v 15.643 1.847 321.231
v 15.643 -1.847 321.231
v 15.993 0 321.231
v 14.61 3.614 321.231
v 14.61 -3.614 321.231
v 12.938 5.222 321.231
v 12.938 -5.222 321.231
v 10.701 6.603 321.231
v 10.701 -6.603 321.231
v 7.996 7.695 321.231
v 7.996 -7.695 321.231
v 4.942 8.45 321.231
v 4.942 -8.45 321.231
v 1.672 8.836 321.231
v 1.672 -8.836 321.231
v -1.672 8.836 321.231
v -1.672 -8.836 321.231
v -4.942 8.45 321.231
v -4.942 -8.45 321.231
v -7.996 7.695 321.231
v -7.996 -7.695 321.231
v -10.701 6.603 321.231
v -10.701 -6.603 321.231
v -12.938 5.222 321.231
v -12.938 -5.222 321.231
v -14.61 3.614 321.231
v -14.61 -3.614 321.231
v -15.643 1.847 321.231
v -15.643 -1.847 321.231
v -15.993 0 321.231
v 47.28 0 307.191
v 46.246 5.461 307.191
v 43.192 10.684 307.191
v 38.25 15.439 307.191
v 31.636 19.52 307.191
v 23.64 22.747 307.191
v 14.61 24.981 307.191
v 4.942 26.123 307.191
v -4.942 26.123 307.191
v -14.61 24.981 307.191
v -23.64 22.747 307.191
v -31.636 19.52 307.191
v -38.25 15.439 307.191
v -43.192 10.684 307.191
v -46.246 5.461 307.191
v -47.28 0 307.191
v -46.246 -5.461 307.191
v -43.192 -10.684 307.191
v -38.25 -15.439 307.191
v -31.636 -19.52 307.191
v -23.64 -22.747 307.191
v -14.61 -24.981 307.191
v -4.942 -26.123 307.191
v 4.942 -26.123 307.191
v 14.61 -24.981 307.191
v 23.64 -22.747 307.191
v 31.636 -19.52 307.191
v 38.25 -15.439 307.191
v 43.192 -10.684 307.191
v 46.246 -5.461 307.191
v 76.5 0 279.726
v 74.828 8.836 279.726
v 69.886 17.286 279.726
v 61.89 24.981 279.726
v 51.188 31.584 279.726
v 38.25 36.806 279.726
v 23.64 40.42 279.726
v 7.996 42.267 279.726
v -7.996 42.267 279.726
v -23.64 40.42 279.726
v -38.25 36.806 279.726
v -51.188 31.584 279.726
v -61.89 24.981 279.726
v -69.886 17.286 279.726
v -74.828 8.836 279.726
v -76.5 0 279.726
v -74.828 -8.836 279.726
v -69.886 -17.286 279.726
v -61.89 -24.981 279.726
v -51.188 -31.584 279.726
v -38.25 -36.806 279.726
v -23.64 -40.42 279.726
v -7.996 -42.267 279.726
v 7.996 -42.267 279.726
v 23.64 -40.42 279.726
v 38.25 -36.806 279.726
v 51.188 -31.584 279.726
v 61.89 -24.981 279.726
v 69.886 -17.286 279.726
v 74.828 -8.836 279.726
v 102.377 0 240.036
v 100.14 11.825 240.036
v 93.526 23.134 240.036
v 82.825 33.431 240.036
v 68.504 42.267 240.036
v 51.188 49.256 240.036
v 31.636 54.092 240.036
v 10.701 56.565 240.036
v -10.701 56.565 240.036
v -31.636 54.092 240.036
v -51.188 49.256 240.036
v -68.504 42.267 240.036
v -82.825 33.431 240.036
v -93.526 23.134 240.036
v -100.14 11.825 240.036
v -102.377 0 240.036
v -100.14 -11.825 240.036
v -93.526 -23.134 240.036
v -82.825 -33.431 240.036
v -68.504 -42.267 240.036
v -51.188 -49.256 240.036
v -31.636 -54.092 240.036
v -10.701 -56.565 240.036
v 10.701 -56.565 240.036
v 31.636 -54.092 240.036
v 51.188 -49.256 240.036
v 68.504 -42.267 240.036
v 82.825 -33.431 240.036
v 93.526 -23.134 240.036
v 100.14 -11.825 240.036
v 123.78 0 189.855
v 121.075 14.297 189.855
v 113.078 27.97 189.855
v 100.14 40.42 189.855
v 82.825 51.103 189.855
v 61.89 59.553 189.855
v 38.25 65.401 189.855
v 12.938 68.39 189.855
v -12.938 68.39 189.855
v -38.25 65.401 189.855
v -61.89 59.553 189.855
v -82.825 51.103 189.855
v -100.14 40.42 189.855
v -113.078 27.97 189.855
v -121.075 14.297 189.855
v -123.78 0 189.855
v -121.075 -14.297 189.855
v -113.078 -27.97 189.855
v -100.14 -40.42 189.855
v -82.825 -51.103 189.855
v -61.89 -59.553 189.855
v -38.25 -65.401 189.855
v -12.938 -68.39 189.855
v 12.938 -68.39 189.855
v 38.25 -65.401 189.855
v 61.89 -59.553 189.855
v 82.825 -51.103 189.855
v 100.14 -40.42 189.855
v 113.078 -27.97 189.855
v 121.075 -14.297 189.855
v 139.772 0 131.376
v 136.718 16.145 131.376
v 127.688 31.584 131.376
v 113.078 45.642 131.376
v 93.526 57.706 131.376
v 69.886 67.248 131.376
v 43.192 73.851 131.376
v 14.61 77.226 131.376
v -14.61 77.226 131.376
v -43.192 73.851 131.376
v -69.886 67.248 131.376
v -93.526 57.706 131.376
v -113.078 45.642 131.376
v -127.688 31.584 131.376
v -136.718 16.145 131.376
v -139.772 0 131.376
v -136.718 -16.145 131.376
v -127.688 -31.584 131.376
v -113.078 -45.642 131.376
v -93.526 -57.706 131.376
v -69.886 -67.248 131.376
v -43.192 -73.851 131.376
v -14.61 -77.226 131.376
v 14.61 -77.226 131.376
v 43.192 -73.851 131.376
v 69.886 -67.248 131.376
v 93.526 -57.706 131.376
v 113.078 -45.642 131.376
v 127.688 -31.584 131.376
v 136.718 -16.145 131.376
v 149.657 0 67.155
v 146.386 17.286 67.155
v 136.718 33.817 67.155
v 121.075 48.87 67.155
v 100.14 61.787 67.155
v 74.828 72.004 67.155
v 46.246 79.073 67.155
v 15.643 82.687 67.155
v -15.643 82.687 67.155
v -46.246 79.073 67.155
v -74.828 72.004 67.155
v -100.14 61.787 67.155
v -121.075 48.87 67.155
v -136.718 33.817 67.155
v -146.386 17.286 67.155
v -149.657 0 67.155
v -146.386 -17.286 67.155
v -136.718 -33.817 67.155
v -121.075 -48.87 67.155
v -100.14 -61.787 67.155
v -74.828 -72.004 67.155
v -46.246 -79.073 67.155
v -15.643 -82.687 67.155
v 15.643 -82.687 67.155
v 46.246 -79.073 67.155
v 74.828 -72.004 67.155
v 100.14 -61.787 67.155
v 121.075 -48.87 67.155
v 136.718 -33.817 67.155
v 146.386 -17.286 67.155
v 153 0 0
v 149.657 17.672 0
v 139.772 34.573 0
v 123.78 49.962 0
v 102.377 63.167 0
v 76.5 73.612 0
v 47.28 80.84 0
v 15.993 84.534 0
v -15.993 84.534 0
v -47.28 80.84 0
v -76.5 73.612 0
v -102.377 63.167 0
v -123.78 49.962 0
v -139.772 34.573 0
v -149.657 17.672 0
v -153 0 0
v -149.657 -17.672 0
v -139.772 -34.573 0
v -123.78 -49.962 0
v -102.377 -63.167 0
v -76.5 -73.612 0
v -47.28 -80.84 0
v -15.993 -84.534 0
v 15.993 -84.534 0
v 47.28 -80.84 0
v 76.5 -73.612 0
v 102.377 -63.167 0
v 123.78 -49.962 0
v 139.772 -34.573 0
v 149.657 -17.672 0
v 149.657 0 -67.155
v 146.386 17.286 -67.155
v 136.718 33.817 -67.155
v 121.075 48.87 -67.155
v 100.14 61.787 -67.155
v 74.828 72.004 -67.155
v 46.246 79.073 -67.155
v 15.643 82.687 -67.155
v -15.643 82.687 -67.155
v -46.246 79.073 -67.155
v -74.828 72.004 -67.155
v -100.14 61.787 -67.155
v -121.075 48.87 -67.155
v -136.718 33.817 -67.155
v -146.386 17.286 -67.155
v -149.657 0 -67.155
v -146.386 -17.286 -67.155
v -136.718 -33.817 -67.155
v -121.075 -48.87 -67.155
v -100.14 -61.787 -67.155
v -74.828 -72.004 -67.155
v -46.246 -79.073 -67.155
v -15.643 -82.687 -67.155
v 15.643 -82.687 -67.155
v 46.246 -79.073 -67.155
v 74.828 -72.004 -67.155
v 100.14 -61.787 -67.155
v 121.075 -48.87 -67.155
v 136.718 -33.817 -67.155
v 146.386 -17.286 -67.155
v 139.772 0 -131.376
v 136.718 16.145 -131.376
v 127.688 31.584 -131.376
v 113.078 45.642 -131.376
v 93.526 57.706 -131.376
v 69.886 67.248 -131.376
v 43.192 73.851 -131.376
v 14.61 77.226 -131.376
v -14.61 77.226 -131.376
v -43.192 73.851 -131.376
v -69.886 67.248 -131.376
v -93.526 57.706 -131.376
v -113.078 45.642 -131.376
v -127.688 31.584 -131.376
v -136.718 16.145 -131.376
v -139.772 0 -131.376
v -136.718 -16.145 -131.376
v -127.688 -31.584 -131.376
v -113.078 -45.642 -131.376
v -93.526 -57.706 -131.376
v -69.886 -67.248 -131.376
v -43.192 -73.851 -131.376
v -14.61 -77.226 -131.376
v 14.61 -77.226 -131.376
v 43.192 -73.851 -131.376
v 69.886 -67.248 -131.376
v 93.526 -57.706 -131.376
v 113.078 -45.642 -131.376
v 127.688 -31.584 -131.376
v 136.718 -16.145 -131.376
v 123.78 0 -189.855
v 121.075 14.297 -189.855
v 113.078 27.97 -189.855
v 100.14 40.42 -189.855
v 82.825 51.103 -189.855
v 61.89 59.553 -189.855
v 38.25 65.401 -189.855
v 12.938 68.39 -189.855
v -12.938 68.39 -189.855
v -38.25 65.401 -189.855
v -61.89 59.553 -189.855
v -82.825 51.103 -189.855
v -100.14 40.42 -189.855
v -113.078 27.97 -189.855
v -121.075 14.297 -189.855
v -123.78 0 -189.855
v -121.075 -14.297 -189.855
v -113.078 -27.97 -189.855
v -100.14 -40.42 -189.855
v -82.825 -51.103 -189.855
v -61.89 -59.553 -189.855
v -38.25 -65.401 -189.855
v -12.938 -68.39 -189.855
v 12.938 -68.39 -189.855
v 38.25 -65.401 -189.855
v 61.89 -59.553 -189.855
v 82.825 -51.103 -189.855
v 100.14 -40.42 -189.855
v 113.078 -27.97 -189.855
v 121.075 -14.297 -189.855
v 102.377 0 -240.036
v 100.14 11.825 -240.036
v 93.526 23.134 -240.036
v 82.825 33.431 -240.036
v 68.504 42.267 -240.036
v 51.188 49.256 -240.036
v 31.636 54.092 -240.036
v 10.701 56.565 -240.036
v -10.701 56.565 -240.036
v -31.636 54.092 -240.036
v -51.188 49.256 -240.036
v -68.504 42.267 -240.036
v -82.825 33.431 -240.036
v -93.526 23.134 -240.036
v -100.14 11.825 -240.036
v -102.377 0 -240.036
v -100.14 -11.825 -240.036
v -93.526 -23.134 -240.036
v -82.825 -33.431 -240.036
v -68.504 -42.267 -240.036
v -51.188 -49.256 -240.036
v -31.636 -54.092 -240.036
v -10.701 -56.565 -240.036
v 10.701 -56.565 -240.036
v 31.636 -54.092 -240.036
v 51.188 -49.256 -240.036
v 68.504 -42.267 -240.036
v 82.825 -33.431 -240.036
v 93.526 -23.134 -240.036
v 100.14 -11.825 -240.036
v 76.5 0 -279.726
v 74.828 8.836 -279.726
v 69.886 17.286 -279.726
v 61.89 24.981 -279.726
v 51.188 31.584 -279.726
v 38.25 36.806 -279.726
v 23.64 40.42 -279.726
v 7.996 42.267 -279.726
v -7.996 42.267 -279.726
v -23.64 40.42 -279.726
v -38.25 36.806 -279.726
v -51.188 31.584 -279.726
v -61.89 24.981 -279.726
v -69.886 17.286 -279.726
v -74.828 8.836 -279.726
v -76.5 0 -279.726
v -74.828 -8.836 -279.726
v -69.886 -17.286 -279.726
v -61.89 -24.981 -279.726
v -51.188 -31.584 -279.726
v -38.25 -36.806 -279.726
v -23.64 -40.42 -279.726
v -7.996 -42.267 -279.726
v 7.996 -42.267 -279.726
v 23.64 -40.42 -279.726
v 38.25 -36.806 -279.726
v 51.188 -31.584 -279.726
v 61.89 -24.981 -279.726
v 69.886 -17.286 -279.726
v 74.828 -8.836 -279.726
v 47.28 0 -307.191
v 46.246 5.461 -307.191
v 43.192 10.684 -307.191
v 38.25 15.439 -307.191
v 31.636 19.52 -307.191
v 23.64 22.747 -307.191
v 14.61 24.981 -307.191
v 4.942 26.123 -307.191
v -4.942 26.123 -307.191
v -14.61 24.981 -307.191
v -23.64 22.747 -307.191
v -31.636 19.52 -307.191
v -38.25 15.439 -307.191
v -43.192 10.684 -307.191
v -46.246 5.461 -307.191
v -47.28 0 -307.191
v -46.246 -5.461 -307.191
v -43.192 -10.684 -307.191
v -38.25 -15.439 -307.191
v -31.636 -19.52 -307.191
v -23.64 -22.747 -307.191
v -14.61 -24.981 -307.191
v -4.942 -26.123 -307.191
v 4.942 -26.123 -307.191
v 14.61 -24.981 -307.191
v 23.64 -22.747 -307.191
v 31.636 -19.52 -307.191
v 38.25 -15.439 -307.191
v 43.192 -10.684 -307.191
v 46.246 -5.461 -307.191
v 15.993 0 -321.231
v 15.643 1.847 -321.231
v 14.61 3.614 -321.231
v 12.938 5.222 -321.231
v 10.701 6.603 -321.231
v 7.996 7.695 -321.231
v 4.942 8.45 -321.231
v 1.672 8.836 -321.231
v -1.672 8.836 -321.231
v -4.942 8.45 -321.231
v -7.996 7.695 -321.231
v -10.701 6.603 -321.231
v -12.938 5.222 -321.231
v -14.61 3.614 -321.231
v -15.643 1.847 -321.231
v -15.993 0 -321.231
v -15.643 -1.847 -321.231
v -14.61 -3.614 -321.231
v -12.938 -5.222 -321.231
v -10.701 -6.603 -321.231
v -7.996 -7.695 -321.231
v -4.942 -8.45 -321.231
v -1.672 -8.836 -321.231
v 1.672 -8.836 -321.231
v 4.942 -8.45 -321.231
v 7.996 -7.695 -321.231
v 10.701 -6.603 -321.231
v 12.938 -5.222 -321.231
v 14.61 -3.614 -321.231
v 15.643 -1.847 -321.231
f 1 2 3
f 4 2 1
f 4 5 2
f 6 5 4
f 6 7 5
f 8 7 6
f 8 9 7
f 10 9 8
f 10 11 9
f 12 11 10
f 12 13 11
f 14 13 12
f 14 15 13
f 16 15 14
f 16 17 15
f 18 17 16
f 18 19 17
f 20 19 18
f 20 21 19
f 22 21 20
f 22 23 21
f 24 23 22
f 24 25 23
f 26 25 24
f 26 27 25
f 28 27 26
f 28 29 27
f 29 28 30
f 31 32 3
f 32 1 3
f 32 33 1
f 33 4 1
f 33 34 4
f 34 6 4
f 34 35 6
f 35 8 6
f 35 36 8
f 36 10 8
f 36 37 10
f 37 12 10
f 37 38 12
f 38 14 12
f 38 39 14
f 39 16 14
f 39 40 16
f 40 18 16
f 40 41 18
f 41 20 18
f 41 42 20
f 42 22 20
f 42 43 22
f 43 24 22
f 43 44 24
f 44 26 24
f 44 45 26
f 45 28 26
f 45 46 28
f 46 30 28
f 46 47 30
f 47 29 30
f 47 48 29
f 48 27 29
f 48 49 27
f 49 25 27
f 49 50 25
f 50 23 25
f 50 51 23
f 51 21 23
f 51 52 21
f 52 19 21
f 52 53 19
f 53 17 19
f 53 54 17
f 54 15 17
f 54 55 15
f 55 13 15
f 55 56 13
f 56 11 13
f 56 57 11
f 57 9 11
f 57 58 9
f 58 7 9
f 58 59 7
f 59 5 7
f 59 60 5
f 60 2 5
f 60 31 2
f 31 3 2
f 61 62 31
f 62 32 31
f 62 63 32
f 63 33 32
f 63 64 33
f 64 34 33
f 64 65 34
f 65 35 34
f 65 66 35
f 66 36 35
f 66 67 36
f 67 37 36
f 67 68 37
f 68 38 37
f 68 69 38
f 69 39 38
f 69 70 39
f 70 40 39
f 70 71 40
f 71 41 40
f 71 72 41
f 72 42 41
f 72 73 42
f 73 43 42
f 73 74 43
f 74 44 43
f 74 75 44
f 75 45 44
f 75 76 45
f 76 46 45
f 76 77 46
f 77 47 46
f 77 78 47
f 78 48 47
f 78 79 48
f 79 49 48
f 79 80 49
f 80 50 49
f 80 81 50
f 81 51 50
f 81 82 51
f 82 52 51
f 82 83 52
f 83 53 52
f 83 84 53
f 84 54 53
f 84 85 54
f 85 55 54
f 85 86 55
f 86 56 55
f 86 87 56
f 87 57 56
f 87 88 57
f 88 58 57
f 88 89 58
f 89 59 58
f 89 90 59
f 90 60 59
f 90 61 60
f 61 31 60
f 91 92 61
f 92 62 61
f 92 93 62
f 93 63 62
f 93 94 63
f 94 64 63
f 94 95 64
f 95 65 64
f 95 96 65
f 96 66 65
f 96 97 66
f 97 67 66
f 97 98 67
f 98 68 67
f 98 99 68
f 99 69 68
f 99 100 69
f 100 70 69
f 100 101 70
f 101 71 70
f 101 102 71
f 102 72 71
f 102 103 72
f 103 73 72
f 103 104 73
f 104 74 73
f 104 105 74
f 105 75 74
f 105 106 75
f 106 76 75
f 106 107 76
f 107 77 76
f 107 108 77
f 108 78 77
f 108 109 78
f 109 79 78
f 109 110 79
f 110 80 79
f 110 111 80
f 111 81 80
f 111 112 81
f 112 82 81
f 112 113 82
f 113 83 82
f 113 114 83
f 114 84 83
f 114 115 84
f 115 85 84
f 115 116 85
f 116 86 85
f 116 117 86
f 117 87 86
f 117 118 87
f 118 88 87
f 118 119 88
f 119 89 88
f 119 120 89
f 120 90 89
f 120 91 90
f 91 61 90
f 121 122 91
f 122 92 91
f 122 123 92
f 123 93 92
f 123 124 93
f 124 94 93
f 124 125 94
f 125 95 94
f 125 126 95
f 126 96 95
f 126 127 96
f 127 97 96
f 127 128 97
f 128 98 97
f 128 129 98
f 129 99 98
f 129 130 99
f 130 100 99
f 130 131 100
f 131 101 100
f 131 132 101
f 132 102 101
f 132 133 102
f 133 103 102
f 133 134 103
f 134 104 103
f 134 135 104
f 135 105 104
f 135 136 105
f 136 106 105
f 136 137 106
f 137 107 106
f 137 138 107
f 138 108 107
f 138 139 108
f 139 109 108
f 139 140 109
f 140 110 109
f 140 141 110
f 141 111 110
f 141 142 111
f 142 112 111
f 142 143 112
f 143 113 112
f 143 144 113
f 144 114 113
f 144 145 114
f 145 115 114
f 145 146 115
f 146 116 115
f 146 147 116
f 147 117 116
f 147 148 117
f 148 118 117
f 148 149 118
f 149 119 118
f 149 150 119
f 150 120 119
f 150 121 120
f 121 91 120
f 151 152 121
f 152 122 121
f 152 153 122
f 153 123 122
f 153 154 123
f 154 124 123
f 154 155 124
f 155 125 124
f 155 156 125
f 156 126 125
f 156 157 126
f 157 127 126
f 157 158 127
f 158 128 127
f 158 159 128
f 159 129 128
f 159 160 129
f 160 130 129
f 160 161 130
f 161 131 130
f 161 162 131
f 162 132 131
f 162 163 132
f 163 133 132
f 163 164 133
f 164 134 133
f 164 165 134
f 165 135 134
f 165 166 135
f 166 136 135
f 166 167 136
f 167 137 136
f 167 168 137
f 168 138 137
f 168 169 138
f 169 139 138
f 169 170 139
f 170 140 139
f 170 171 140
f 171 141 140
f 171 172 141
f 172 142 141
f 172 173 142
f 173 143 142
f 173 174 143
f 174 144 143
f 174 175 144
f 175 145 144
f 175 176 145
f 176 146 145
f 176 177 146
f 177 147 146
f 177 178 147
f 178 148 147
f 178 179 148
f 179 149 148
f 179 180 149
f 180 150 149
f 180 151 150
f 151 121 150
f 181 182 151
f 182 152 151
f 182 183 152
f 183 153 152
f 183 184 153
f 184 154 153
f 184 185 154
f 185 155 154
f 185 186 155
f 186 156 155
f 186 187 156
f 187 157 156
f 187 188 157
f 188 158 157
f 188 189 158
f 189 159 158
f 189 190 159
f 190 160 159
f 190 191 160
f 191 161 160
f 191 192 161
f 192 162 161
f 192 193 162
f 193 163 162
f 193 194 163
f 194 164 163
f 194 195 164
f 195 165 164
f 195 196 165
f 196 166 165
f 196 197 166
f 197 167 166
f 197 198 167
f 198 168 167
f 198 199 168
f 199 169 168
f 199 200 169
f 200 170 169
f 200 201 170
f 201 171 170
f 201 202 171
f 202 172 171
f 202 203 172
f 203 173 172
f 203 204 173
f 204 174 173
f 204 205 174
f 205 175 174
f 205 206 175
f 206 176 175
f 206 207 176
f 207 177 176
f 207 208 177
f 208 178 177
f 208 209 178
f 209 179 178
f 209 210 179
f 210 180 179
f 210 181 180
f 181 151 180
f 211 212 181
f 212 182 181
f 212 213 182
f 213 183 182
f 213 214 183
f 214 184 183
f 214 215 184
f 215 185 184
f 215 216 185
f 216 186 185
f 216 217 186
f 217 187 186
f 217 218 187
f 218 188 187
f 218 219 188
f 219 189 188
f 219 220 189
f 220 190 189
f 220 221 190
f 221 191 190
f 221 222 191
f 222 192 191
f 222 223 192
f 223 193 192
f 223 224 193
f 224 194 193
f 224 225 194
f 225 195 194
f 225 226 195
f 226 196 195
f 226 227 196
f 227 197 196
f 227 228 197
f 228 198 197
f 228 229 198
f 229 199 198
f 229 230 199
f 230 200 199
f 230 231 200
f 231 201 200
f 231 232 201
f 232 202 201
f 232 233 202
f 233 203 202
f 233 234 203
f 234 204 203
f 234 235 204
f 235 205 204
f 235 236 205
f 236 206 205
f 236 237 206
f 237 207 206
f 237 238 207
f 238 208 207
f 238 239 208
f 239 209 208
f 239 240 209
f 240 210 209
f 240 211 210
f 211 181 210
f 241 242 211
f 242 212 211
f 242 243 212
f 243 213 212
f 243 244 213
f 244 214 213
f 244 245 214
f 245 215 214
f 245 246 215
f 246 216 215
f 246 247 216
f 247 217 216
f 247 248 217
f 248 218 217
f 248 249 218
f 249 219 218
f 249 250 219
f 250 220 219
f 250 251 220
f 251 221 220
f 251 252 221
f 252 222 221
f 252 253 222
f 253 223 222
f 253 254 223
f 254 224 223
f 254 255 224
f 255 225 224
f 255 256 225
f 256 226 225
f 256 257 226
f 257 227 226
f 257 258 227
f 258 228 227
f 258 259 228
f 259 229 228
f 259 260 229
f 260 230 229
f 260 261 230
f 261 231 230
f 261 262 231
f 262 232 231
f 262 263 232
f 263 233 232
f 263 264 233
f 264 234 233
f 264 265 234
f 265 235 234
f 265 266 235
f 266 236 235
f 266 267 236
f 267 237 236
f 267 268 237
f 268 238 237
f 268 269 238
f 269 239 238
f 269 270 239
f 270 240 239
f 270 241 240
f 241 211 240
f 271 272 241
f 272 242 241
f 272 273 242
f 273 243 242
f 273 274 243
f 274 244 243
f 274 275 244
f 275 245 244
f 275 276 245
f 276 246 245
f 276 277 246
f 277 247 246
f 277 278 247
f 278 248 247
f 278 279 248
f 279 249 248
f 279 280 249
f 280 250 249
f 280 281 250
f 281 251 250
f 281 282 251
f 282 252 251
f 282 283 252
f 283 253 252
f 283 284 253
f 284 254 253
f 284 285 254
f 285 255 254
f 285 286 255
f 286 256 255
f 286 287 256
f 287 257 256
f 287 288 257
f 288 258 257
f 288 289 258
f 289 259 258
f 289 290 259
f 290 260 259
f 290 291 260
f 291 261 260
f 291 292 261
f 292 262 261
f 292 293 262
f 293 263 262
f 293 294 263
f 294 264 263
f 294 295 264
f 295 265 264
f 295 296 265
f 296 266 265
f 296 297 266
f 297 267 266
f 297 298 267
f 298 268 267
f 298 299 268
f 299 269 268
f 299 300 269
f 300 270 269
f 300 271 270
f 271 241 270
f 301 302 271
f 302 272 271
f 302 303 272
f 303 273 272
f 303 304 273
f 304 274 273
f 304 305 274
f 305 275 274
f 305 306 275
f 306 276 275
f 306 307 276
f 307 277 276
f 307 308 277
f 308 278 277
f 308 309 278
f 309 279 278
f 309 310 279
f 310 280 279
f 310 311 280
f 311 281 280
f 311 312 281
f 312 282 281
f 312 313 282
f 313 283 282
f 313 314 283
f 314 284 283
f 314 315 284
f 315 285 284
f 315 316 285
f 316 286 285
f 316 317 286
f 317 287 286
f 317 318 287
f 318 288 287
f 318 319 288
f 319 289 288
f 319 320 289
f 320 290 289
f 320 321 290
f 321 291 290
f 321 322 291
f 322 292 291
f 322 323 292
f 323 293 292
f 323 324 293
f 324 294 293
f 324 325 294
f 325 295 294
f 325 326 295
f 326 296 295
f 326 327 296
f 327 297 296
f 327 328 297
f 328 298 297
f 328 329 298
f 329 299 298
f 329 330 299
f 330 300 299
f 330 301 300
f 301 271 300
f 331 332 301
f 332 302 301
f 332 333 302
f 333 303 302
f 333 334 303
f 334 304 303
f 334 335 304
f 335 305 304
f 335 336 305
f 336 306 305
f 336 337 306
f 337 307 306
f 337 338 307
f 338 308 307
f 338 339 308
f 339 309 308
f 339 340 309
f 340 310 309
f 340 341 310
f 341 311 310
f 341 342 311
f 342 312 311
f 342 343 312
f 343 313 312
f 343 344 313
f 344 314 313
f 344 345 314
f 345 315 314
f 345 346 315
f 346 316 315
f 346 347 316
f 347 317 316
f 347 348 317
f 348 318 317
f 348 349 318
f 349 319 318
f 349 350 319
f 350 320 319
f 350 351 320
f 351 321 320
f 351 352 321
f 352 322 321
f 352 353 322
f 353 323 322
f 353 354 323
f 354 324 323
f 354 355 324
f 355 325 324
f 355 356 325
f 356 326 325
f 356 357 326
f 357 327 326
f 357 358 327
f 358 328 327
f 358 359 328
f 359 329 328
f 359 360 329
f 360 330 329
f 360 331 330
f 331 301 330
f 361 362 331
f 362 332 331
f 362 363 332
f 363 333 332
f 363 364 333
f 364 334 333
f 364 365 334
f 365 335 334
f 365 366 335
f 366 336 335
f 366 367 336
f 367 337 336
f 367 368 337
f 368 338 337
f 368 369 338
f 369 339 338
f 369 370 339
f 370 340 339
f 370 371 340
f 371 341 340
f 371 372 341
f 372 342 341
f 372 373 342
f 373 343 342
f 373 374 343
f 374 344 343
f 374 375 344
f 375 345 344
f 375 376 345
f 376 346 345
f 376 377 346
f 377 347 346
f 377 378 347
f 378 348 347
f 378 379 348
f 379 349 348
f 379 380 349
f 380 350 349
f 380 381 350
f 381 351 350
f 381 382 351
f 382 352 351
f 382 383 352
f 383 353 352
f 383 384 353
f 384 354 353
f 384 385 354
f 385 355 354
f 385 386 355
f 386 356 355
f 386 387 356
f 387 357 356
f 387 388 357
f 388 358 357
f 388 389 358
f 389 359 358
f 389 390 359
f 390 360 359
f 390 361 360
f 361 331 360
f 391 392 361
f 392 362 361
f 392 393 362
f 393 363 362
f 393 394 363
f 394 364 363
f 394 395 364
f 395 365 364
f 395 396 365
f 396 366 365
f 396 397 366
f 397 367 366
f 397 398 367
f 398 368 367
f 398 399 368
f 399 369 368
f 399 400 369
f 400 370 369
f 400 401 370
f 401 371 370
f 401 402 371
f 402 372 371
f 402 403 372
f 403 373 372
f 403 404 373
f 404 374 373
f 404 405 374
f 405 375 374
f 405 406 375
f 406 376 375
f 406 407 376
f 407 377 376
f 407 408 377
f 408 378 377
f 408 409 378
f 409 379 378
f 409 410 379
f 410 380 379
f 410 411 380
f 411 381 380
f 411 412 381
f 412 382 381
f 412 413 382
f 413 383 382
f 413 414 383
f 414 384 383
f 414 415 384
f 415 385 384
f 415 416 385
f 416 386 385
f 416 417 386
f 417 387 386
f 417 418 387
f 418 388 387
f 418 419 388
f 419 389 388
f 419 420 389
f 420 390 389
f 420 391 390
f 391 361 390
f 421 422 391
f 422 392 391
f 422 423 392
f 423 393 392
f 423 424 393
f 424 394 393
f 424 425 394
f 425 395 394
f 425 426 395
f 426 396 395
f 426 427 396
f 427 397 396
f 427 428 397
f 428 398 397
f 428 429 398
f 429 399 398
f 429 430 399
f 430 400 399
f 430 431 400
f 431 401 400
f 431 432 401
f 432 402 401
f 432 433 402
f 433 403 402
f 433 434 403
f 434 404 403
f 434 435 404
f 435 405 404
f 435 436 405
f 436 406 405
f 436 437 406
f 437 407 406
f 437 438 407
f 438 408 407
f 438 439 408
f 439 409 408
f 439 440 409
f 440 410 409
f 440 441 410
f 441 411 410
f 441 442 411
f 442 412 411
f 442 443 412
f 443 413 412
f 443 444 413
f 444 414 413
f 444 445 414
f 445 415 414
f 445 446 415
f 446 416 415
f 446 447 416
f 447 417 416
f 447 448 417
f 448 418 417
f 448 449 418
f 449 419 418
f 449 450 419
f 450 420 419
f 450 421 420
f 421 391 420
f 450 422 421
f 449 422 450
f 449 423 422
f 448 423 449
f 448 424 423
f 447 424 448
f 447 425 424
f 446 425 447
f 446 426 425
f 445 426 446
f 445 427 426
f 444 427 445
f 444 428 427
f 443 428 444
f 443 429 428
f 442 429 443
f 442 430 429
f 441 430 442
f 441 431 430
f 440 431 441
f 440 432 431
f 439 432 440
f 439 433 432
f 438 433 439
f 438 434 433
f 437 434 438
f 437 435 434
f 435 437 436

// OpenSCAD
// Generated by SolidPython 1.0.1 on 2020-07-29 00:46:48


scale(v = [9, 5, 19]) {
	sphere(r = 17);
}
/***********************************************
*********      SolidPython code:      **********
************************************************
 
# import packages: SolidPython
from solid import *
from solid.utils import *
from itertools import chain, combinations, permutations


class Resize:

    def __init__(self, scad_file):
        self.scad_file = scad_file
        #self.scad_file = import_scad(scad_file)
        # cone/cylinder param:
        self.r1 = 0
        self.r2 = 0
        self.h = 0
        # rectangular prism param:
        self.w = 0
        self.l = 0
        # ellipse param:
        self.r = 0

    # import OpenScad code (file name corresponds to shape)


    # classify shape + parameters
    def assign(self, param1, param2, param3):
        if self.scad_file == 'cone.scad':
            self.r1 = param1
            self.r2 = param2
            self.h = param3
        elif self.scad_file == 'cylinder.scad':
            self.r1 = param1
            self.r2 = param2
            self.h = param3
        elif self.scad_file == 'rectangularPrism.scad':
            self.h = param1
            self.l = param2
            self.w = param3
        else:
            self.r = param1
            self.h = param2

    # resize parameters
    def iterate(self):
        x = range(3, 20, 2)
        i = 1
        if self.scad_file == 'cone.scad':
            tempList = list(permutations(x, 2))
            for temp in tempList:
                param1 = temp[0]
                param2 = temp[1]
                filepath = 'produced_scad_files/' + 'cone' + str(param1) + '_' + str(param2) + '_' + '.scad'
                scad_render_to_file(cylinder(h=param1, r1=param2, r2=0), filepath)

        elif self.scad_file == 'cylinder.scad':
            tempList = list(permutations(x, 3))
            for temp in tempList:
                param1 = temp[0]
                param2 = temp[1]
                filepath = 'produced_scad_files/' + 'cylinder' + str(param1) + '_' + str(param2) + '_' + '.scad'
                scad_render_to_file(cylinder(h=param1, r1=param2, r2=param2), filepath)

        elif self.scad_file == 'rectangularPrism.scad':
            tempList = list(permutations(x, 3))
            for temp in tempList:
                param1 = temp[0]
                param2 = temp[1]
                param3 = temp[2]
                filepath = 'produced_scad_files/' + 'rectangularPrism' + str(param1) + '_' + str(param2) + '_' + str(
                    param3) + '.scad'
                scad_render_to_file(cube(size=(param1, param2, param3)), filepath)

        elif self.scad_file == 'ellipse.scad':
            tempList = list(permutations(x, 4))
            for temp in tempList:
                param1 = temp[0]
                param2 = temp[1]
                param3 = temp[2]
                param4 = temp[3]
                filepath = 'produced_scad_files/' + 'ellipse' + str(param1) + '_' + str(param2) + '_' + str(param3) + '_' + str(param4) + '.scad'
                scad_render_to_file(scale([param1, param2, param3])(sphere(r=param4)), filepath)

    def render_to_scadfile(self):
        scad_render_to_file(scad, 'example.scad') 
 
************************************************/
